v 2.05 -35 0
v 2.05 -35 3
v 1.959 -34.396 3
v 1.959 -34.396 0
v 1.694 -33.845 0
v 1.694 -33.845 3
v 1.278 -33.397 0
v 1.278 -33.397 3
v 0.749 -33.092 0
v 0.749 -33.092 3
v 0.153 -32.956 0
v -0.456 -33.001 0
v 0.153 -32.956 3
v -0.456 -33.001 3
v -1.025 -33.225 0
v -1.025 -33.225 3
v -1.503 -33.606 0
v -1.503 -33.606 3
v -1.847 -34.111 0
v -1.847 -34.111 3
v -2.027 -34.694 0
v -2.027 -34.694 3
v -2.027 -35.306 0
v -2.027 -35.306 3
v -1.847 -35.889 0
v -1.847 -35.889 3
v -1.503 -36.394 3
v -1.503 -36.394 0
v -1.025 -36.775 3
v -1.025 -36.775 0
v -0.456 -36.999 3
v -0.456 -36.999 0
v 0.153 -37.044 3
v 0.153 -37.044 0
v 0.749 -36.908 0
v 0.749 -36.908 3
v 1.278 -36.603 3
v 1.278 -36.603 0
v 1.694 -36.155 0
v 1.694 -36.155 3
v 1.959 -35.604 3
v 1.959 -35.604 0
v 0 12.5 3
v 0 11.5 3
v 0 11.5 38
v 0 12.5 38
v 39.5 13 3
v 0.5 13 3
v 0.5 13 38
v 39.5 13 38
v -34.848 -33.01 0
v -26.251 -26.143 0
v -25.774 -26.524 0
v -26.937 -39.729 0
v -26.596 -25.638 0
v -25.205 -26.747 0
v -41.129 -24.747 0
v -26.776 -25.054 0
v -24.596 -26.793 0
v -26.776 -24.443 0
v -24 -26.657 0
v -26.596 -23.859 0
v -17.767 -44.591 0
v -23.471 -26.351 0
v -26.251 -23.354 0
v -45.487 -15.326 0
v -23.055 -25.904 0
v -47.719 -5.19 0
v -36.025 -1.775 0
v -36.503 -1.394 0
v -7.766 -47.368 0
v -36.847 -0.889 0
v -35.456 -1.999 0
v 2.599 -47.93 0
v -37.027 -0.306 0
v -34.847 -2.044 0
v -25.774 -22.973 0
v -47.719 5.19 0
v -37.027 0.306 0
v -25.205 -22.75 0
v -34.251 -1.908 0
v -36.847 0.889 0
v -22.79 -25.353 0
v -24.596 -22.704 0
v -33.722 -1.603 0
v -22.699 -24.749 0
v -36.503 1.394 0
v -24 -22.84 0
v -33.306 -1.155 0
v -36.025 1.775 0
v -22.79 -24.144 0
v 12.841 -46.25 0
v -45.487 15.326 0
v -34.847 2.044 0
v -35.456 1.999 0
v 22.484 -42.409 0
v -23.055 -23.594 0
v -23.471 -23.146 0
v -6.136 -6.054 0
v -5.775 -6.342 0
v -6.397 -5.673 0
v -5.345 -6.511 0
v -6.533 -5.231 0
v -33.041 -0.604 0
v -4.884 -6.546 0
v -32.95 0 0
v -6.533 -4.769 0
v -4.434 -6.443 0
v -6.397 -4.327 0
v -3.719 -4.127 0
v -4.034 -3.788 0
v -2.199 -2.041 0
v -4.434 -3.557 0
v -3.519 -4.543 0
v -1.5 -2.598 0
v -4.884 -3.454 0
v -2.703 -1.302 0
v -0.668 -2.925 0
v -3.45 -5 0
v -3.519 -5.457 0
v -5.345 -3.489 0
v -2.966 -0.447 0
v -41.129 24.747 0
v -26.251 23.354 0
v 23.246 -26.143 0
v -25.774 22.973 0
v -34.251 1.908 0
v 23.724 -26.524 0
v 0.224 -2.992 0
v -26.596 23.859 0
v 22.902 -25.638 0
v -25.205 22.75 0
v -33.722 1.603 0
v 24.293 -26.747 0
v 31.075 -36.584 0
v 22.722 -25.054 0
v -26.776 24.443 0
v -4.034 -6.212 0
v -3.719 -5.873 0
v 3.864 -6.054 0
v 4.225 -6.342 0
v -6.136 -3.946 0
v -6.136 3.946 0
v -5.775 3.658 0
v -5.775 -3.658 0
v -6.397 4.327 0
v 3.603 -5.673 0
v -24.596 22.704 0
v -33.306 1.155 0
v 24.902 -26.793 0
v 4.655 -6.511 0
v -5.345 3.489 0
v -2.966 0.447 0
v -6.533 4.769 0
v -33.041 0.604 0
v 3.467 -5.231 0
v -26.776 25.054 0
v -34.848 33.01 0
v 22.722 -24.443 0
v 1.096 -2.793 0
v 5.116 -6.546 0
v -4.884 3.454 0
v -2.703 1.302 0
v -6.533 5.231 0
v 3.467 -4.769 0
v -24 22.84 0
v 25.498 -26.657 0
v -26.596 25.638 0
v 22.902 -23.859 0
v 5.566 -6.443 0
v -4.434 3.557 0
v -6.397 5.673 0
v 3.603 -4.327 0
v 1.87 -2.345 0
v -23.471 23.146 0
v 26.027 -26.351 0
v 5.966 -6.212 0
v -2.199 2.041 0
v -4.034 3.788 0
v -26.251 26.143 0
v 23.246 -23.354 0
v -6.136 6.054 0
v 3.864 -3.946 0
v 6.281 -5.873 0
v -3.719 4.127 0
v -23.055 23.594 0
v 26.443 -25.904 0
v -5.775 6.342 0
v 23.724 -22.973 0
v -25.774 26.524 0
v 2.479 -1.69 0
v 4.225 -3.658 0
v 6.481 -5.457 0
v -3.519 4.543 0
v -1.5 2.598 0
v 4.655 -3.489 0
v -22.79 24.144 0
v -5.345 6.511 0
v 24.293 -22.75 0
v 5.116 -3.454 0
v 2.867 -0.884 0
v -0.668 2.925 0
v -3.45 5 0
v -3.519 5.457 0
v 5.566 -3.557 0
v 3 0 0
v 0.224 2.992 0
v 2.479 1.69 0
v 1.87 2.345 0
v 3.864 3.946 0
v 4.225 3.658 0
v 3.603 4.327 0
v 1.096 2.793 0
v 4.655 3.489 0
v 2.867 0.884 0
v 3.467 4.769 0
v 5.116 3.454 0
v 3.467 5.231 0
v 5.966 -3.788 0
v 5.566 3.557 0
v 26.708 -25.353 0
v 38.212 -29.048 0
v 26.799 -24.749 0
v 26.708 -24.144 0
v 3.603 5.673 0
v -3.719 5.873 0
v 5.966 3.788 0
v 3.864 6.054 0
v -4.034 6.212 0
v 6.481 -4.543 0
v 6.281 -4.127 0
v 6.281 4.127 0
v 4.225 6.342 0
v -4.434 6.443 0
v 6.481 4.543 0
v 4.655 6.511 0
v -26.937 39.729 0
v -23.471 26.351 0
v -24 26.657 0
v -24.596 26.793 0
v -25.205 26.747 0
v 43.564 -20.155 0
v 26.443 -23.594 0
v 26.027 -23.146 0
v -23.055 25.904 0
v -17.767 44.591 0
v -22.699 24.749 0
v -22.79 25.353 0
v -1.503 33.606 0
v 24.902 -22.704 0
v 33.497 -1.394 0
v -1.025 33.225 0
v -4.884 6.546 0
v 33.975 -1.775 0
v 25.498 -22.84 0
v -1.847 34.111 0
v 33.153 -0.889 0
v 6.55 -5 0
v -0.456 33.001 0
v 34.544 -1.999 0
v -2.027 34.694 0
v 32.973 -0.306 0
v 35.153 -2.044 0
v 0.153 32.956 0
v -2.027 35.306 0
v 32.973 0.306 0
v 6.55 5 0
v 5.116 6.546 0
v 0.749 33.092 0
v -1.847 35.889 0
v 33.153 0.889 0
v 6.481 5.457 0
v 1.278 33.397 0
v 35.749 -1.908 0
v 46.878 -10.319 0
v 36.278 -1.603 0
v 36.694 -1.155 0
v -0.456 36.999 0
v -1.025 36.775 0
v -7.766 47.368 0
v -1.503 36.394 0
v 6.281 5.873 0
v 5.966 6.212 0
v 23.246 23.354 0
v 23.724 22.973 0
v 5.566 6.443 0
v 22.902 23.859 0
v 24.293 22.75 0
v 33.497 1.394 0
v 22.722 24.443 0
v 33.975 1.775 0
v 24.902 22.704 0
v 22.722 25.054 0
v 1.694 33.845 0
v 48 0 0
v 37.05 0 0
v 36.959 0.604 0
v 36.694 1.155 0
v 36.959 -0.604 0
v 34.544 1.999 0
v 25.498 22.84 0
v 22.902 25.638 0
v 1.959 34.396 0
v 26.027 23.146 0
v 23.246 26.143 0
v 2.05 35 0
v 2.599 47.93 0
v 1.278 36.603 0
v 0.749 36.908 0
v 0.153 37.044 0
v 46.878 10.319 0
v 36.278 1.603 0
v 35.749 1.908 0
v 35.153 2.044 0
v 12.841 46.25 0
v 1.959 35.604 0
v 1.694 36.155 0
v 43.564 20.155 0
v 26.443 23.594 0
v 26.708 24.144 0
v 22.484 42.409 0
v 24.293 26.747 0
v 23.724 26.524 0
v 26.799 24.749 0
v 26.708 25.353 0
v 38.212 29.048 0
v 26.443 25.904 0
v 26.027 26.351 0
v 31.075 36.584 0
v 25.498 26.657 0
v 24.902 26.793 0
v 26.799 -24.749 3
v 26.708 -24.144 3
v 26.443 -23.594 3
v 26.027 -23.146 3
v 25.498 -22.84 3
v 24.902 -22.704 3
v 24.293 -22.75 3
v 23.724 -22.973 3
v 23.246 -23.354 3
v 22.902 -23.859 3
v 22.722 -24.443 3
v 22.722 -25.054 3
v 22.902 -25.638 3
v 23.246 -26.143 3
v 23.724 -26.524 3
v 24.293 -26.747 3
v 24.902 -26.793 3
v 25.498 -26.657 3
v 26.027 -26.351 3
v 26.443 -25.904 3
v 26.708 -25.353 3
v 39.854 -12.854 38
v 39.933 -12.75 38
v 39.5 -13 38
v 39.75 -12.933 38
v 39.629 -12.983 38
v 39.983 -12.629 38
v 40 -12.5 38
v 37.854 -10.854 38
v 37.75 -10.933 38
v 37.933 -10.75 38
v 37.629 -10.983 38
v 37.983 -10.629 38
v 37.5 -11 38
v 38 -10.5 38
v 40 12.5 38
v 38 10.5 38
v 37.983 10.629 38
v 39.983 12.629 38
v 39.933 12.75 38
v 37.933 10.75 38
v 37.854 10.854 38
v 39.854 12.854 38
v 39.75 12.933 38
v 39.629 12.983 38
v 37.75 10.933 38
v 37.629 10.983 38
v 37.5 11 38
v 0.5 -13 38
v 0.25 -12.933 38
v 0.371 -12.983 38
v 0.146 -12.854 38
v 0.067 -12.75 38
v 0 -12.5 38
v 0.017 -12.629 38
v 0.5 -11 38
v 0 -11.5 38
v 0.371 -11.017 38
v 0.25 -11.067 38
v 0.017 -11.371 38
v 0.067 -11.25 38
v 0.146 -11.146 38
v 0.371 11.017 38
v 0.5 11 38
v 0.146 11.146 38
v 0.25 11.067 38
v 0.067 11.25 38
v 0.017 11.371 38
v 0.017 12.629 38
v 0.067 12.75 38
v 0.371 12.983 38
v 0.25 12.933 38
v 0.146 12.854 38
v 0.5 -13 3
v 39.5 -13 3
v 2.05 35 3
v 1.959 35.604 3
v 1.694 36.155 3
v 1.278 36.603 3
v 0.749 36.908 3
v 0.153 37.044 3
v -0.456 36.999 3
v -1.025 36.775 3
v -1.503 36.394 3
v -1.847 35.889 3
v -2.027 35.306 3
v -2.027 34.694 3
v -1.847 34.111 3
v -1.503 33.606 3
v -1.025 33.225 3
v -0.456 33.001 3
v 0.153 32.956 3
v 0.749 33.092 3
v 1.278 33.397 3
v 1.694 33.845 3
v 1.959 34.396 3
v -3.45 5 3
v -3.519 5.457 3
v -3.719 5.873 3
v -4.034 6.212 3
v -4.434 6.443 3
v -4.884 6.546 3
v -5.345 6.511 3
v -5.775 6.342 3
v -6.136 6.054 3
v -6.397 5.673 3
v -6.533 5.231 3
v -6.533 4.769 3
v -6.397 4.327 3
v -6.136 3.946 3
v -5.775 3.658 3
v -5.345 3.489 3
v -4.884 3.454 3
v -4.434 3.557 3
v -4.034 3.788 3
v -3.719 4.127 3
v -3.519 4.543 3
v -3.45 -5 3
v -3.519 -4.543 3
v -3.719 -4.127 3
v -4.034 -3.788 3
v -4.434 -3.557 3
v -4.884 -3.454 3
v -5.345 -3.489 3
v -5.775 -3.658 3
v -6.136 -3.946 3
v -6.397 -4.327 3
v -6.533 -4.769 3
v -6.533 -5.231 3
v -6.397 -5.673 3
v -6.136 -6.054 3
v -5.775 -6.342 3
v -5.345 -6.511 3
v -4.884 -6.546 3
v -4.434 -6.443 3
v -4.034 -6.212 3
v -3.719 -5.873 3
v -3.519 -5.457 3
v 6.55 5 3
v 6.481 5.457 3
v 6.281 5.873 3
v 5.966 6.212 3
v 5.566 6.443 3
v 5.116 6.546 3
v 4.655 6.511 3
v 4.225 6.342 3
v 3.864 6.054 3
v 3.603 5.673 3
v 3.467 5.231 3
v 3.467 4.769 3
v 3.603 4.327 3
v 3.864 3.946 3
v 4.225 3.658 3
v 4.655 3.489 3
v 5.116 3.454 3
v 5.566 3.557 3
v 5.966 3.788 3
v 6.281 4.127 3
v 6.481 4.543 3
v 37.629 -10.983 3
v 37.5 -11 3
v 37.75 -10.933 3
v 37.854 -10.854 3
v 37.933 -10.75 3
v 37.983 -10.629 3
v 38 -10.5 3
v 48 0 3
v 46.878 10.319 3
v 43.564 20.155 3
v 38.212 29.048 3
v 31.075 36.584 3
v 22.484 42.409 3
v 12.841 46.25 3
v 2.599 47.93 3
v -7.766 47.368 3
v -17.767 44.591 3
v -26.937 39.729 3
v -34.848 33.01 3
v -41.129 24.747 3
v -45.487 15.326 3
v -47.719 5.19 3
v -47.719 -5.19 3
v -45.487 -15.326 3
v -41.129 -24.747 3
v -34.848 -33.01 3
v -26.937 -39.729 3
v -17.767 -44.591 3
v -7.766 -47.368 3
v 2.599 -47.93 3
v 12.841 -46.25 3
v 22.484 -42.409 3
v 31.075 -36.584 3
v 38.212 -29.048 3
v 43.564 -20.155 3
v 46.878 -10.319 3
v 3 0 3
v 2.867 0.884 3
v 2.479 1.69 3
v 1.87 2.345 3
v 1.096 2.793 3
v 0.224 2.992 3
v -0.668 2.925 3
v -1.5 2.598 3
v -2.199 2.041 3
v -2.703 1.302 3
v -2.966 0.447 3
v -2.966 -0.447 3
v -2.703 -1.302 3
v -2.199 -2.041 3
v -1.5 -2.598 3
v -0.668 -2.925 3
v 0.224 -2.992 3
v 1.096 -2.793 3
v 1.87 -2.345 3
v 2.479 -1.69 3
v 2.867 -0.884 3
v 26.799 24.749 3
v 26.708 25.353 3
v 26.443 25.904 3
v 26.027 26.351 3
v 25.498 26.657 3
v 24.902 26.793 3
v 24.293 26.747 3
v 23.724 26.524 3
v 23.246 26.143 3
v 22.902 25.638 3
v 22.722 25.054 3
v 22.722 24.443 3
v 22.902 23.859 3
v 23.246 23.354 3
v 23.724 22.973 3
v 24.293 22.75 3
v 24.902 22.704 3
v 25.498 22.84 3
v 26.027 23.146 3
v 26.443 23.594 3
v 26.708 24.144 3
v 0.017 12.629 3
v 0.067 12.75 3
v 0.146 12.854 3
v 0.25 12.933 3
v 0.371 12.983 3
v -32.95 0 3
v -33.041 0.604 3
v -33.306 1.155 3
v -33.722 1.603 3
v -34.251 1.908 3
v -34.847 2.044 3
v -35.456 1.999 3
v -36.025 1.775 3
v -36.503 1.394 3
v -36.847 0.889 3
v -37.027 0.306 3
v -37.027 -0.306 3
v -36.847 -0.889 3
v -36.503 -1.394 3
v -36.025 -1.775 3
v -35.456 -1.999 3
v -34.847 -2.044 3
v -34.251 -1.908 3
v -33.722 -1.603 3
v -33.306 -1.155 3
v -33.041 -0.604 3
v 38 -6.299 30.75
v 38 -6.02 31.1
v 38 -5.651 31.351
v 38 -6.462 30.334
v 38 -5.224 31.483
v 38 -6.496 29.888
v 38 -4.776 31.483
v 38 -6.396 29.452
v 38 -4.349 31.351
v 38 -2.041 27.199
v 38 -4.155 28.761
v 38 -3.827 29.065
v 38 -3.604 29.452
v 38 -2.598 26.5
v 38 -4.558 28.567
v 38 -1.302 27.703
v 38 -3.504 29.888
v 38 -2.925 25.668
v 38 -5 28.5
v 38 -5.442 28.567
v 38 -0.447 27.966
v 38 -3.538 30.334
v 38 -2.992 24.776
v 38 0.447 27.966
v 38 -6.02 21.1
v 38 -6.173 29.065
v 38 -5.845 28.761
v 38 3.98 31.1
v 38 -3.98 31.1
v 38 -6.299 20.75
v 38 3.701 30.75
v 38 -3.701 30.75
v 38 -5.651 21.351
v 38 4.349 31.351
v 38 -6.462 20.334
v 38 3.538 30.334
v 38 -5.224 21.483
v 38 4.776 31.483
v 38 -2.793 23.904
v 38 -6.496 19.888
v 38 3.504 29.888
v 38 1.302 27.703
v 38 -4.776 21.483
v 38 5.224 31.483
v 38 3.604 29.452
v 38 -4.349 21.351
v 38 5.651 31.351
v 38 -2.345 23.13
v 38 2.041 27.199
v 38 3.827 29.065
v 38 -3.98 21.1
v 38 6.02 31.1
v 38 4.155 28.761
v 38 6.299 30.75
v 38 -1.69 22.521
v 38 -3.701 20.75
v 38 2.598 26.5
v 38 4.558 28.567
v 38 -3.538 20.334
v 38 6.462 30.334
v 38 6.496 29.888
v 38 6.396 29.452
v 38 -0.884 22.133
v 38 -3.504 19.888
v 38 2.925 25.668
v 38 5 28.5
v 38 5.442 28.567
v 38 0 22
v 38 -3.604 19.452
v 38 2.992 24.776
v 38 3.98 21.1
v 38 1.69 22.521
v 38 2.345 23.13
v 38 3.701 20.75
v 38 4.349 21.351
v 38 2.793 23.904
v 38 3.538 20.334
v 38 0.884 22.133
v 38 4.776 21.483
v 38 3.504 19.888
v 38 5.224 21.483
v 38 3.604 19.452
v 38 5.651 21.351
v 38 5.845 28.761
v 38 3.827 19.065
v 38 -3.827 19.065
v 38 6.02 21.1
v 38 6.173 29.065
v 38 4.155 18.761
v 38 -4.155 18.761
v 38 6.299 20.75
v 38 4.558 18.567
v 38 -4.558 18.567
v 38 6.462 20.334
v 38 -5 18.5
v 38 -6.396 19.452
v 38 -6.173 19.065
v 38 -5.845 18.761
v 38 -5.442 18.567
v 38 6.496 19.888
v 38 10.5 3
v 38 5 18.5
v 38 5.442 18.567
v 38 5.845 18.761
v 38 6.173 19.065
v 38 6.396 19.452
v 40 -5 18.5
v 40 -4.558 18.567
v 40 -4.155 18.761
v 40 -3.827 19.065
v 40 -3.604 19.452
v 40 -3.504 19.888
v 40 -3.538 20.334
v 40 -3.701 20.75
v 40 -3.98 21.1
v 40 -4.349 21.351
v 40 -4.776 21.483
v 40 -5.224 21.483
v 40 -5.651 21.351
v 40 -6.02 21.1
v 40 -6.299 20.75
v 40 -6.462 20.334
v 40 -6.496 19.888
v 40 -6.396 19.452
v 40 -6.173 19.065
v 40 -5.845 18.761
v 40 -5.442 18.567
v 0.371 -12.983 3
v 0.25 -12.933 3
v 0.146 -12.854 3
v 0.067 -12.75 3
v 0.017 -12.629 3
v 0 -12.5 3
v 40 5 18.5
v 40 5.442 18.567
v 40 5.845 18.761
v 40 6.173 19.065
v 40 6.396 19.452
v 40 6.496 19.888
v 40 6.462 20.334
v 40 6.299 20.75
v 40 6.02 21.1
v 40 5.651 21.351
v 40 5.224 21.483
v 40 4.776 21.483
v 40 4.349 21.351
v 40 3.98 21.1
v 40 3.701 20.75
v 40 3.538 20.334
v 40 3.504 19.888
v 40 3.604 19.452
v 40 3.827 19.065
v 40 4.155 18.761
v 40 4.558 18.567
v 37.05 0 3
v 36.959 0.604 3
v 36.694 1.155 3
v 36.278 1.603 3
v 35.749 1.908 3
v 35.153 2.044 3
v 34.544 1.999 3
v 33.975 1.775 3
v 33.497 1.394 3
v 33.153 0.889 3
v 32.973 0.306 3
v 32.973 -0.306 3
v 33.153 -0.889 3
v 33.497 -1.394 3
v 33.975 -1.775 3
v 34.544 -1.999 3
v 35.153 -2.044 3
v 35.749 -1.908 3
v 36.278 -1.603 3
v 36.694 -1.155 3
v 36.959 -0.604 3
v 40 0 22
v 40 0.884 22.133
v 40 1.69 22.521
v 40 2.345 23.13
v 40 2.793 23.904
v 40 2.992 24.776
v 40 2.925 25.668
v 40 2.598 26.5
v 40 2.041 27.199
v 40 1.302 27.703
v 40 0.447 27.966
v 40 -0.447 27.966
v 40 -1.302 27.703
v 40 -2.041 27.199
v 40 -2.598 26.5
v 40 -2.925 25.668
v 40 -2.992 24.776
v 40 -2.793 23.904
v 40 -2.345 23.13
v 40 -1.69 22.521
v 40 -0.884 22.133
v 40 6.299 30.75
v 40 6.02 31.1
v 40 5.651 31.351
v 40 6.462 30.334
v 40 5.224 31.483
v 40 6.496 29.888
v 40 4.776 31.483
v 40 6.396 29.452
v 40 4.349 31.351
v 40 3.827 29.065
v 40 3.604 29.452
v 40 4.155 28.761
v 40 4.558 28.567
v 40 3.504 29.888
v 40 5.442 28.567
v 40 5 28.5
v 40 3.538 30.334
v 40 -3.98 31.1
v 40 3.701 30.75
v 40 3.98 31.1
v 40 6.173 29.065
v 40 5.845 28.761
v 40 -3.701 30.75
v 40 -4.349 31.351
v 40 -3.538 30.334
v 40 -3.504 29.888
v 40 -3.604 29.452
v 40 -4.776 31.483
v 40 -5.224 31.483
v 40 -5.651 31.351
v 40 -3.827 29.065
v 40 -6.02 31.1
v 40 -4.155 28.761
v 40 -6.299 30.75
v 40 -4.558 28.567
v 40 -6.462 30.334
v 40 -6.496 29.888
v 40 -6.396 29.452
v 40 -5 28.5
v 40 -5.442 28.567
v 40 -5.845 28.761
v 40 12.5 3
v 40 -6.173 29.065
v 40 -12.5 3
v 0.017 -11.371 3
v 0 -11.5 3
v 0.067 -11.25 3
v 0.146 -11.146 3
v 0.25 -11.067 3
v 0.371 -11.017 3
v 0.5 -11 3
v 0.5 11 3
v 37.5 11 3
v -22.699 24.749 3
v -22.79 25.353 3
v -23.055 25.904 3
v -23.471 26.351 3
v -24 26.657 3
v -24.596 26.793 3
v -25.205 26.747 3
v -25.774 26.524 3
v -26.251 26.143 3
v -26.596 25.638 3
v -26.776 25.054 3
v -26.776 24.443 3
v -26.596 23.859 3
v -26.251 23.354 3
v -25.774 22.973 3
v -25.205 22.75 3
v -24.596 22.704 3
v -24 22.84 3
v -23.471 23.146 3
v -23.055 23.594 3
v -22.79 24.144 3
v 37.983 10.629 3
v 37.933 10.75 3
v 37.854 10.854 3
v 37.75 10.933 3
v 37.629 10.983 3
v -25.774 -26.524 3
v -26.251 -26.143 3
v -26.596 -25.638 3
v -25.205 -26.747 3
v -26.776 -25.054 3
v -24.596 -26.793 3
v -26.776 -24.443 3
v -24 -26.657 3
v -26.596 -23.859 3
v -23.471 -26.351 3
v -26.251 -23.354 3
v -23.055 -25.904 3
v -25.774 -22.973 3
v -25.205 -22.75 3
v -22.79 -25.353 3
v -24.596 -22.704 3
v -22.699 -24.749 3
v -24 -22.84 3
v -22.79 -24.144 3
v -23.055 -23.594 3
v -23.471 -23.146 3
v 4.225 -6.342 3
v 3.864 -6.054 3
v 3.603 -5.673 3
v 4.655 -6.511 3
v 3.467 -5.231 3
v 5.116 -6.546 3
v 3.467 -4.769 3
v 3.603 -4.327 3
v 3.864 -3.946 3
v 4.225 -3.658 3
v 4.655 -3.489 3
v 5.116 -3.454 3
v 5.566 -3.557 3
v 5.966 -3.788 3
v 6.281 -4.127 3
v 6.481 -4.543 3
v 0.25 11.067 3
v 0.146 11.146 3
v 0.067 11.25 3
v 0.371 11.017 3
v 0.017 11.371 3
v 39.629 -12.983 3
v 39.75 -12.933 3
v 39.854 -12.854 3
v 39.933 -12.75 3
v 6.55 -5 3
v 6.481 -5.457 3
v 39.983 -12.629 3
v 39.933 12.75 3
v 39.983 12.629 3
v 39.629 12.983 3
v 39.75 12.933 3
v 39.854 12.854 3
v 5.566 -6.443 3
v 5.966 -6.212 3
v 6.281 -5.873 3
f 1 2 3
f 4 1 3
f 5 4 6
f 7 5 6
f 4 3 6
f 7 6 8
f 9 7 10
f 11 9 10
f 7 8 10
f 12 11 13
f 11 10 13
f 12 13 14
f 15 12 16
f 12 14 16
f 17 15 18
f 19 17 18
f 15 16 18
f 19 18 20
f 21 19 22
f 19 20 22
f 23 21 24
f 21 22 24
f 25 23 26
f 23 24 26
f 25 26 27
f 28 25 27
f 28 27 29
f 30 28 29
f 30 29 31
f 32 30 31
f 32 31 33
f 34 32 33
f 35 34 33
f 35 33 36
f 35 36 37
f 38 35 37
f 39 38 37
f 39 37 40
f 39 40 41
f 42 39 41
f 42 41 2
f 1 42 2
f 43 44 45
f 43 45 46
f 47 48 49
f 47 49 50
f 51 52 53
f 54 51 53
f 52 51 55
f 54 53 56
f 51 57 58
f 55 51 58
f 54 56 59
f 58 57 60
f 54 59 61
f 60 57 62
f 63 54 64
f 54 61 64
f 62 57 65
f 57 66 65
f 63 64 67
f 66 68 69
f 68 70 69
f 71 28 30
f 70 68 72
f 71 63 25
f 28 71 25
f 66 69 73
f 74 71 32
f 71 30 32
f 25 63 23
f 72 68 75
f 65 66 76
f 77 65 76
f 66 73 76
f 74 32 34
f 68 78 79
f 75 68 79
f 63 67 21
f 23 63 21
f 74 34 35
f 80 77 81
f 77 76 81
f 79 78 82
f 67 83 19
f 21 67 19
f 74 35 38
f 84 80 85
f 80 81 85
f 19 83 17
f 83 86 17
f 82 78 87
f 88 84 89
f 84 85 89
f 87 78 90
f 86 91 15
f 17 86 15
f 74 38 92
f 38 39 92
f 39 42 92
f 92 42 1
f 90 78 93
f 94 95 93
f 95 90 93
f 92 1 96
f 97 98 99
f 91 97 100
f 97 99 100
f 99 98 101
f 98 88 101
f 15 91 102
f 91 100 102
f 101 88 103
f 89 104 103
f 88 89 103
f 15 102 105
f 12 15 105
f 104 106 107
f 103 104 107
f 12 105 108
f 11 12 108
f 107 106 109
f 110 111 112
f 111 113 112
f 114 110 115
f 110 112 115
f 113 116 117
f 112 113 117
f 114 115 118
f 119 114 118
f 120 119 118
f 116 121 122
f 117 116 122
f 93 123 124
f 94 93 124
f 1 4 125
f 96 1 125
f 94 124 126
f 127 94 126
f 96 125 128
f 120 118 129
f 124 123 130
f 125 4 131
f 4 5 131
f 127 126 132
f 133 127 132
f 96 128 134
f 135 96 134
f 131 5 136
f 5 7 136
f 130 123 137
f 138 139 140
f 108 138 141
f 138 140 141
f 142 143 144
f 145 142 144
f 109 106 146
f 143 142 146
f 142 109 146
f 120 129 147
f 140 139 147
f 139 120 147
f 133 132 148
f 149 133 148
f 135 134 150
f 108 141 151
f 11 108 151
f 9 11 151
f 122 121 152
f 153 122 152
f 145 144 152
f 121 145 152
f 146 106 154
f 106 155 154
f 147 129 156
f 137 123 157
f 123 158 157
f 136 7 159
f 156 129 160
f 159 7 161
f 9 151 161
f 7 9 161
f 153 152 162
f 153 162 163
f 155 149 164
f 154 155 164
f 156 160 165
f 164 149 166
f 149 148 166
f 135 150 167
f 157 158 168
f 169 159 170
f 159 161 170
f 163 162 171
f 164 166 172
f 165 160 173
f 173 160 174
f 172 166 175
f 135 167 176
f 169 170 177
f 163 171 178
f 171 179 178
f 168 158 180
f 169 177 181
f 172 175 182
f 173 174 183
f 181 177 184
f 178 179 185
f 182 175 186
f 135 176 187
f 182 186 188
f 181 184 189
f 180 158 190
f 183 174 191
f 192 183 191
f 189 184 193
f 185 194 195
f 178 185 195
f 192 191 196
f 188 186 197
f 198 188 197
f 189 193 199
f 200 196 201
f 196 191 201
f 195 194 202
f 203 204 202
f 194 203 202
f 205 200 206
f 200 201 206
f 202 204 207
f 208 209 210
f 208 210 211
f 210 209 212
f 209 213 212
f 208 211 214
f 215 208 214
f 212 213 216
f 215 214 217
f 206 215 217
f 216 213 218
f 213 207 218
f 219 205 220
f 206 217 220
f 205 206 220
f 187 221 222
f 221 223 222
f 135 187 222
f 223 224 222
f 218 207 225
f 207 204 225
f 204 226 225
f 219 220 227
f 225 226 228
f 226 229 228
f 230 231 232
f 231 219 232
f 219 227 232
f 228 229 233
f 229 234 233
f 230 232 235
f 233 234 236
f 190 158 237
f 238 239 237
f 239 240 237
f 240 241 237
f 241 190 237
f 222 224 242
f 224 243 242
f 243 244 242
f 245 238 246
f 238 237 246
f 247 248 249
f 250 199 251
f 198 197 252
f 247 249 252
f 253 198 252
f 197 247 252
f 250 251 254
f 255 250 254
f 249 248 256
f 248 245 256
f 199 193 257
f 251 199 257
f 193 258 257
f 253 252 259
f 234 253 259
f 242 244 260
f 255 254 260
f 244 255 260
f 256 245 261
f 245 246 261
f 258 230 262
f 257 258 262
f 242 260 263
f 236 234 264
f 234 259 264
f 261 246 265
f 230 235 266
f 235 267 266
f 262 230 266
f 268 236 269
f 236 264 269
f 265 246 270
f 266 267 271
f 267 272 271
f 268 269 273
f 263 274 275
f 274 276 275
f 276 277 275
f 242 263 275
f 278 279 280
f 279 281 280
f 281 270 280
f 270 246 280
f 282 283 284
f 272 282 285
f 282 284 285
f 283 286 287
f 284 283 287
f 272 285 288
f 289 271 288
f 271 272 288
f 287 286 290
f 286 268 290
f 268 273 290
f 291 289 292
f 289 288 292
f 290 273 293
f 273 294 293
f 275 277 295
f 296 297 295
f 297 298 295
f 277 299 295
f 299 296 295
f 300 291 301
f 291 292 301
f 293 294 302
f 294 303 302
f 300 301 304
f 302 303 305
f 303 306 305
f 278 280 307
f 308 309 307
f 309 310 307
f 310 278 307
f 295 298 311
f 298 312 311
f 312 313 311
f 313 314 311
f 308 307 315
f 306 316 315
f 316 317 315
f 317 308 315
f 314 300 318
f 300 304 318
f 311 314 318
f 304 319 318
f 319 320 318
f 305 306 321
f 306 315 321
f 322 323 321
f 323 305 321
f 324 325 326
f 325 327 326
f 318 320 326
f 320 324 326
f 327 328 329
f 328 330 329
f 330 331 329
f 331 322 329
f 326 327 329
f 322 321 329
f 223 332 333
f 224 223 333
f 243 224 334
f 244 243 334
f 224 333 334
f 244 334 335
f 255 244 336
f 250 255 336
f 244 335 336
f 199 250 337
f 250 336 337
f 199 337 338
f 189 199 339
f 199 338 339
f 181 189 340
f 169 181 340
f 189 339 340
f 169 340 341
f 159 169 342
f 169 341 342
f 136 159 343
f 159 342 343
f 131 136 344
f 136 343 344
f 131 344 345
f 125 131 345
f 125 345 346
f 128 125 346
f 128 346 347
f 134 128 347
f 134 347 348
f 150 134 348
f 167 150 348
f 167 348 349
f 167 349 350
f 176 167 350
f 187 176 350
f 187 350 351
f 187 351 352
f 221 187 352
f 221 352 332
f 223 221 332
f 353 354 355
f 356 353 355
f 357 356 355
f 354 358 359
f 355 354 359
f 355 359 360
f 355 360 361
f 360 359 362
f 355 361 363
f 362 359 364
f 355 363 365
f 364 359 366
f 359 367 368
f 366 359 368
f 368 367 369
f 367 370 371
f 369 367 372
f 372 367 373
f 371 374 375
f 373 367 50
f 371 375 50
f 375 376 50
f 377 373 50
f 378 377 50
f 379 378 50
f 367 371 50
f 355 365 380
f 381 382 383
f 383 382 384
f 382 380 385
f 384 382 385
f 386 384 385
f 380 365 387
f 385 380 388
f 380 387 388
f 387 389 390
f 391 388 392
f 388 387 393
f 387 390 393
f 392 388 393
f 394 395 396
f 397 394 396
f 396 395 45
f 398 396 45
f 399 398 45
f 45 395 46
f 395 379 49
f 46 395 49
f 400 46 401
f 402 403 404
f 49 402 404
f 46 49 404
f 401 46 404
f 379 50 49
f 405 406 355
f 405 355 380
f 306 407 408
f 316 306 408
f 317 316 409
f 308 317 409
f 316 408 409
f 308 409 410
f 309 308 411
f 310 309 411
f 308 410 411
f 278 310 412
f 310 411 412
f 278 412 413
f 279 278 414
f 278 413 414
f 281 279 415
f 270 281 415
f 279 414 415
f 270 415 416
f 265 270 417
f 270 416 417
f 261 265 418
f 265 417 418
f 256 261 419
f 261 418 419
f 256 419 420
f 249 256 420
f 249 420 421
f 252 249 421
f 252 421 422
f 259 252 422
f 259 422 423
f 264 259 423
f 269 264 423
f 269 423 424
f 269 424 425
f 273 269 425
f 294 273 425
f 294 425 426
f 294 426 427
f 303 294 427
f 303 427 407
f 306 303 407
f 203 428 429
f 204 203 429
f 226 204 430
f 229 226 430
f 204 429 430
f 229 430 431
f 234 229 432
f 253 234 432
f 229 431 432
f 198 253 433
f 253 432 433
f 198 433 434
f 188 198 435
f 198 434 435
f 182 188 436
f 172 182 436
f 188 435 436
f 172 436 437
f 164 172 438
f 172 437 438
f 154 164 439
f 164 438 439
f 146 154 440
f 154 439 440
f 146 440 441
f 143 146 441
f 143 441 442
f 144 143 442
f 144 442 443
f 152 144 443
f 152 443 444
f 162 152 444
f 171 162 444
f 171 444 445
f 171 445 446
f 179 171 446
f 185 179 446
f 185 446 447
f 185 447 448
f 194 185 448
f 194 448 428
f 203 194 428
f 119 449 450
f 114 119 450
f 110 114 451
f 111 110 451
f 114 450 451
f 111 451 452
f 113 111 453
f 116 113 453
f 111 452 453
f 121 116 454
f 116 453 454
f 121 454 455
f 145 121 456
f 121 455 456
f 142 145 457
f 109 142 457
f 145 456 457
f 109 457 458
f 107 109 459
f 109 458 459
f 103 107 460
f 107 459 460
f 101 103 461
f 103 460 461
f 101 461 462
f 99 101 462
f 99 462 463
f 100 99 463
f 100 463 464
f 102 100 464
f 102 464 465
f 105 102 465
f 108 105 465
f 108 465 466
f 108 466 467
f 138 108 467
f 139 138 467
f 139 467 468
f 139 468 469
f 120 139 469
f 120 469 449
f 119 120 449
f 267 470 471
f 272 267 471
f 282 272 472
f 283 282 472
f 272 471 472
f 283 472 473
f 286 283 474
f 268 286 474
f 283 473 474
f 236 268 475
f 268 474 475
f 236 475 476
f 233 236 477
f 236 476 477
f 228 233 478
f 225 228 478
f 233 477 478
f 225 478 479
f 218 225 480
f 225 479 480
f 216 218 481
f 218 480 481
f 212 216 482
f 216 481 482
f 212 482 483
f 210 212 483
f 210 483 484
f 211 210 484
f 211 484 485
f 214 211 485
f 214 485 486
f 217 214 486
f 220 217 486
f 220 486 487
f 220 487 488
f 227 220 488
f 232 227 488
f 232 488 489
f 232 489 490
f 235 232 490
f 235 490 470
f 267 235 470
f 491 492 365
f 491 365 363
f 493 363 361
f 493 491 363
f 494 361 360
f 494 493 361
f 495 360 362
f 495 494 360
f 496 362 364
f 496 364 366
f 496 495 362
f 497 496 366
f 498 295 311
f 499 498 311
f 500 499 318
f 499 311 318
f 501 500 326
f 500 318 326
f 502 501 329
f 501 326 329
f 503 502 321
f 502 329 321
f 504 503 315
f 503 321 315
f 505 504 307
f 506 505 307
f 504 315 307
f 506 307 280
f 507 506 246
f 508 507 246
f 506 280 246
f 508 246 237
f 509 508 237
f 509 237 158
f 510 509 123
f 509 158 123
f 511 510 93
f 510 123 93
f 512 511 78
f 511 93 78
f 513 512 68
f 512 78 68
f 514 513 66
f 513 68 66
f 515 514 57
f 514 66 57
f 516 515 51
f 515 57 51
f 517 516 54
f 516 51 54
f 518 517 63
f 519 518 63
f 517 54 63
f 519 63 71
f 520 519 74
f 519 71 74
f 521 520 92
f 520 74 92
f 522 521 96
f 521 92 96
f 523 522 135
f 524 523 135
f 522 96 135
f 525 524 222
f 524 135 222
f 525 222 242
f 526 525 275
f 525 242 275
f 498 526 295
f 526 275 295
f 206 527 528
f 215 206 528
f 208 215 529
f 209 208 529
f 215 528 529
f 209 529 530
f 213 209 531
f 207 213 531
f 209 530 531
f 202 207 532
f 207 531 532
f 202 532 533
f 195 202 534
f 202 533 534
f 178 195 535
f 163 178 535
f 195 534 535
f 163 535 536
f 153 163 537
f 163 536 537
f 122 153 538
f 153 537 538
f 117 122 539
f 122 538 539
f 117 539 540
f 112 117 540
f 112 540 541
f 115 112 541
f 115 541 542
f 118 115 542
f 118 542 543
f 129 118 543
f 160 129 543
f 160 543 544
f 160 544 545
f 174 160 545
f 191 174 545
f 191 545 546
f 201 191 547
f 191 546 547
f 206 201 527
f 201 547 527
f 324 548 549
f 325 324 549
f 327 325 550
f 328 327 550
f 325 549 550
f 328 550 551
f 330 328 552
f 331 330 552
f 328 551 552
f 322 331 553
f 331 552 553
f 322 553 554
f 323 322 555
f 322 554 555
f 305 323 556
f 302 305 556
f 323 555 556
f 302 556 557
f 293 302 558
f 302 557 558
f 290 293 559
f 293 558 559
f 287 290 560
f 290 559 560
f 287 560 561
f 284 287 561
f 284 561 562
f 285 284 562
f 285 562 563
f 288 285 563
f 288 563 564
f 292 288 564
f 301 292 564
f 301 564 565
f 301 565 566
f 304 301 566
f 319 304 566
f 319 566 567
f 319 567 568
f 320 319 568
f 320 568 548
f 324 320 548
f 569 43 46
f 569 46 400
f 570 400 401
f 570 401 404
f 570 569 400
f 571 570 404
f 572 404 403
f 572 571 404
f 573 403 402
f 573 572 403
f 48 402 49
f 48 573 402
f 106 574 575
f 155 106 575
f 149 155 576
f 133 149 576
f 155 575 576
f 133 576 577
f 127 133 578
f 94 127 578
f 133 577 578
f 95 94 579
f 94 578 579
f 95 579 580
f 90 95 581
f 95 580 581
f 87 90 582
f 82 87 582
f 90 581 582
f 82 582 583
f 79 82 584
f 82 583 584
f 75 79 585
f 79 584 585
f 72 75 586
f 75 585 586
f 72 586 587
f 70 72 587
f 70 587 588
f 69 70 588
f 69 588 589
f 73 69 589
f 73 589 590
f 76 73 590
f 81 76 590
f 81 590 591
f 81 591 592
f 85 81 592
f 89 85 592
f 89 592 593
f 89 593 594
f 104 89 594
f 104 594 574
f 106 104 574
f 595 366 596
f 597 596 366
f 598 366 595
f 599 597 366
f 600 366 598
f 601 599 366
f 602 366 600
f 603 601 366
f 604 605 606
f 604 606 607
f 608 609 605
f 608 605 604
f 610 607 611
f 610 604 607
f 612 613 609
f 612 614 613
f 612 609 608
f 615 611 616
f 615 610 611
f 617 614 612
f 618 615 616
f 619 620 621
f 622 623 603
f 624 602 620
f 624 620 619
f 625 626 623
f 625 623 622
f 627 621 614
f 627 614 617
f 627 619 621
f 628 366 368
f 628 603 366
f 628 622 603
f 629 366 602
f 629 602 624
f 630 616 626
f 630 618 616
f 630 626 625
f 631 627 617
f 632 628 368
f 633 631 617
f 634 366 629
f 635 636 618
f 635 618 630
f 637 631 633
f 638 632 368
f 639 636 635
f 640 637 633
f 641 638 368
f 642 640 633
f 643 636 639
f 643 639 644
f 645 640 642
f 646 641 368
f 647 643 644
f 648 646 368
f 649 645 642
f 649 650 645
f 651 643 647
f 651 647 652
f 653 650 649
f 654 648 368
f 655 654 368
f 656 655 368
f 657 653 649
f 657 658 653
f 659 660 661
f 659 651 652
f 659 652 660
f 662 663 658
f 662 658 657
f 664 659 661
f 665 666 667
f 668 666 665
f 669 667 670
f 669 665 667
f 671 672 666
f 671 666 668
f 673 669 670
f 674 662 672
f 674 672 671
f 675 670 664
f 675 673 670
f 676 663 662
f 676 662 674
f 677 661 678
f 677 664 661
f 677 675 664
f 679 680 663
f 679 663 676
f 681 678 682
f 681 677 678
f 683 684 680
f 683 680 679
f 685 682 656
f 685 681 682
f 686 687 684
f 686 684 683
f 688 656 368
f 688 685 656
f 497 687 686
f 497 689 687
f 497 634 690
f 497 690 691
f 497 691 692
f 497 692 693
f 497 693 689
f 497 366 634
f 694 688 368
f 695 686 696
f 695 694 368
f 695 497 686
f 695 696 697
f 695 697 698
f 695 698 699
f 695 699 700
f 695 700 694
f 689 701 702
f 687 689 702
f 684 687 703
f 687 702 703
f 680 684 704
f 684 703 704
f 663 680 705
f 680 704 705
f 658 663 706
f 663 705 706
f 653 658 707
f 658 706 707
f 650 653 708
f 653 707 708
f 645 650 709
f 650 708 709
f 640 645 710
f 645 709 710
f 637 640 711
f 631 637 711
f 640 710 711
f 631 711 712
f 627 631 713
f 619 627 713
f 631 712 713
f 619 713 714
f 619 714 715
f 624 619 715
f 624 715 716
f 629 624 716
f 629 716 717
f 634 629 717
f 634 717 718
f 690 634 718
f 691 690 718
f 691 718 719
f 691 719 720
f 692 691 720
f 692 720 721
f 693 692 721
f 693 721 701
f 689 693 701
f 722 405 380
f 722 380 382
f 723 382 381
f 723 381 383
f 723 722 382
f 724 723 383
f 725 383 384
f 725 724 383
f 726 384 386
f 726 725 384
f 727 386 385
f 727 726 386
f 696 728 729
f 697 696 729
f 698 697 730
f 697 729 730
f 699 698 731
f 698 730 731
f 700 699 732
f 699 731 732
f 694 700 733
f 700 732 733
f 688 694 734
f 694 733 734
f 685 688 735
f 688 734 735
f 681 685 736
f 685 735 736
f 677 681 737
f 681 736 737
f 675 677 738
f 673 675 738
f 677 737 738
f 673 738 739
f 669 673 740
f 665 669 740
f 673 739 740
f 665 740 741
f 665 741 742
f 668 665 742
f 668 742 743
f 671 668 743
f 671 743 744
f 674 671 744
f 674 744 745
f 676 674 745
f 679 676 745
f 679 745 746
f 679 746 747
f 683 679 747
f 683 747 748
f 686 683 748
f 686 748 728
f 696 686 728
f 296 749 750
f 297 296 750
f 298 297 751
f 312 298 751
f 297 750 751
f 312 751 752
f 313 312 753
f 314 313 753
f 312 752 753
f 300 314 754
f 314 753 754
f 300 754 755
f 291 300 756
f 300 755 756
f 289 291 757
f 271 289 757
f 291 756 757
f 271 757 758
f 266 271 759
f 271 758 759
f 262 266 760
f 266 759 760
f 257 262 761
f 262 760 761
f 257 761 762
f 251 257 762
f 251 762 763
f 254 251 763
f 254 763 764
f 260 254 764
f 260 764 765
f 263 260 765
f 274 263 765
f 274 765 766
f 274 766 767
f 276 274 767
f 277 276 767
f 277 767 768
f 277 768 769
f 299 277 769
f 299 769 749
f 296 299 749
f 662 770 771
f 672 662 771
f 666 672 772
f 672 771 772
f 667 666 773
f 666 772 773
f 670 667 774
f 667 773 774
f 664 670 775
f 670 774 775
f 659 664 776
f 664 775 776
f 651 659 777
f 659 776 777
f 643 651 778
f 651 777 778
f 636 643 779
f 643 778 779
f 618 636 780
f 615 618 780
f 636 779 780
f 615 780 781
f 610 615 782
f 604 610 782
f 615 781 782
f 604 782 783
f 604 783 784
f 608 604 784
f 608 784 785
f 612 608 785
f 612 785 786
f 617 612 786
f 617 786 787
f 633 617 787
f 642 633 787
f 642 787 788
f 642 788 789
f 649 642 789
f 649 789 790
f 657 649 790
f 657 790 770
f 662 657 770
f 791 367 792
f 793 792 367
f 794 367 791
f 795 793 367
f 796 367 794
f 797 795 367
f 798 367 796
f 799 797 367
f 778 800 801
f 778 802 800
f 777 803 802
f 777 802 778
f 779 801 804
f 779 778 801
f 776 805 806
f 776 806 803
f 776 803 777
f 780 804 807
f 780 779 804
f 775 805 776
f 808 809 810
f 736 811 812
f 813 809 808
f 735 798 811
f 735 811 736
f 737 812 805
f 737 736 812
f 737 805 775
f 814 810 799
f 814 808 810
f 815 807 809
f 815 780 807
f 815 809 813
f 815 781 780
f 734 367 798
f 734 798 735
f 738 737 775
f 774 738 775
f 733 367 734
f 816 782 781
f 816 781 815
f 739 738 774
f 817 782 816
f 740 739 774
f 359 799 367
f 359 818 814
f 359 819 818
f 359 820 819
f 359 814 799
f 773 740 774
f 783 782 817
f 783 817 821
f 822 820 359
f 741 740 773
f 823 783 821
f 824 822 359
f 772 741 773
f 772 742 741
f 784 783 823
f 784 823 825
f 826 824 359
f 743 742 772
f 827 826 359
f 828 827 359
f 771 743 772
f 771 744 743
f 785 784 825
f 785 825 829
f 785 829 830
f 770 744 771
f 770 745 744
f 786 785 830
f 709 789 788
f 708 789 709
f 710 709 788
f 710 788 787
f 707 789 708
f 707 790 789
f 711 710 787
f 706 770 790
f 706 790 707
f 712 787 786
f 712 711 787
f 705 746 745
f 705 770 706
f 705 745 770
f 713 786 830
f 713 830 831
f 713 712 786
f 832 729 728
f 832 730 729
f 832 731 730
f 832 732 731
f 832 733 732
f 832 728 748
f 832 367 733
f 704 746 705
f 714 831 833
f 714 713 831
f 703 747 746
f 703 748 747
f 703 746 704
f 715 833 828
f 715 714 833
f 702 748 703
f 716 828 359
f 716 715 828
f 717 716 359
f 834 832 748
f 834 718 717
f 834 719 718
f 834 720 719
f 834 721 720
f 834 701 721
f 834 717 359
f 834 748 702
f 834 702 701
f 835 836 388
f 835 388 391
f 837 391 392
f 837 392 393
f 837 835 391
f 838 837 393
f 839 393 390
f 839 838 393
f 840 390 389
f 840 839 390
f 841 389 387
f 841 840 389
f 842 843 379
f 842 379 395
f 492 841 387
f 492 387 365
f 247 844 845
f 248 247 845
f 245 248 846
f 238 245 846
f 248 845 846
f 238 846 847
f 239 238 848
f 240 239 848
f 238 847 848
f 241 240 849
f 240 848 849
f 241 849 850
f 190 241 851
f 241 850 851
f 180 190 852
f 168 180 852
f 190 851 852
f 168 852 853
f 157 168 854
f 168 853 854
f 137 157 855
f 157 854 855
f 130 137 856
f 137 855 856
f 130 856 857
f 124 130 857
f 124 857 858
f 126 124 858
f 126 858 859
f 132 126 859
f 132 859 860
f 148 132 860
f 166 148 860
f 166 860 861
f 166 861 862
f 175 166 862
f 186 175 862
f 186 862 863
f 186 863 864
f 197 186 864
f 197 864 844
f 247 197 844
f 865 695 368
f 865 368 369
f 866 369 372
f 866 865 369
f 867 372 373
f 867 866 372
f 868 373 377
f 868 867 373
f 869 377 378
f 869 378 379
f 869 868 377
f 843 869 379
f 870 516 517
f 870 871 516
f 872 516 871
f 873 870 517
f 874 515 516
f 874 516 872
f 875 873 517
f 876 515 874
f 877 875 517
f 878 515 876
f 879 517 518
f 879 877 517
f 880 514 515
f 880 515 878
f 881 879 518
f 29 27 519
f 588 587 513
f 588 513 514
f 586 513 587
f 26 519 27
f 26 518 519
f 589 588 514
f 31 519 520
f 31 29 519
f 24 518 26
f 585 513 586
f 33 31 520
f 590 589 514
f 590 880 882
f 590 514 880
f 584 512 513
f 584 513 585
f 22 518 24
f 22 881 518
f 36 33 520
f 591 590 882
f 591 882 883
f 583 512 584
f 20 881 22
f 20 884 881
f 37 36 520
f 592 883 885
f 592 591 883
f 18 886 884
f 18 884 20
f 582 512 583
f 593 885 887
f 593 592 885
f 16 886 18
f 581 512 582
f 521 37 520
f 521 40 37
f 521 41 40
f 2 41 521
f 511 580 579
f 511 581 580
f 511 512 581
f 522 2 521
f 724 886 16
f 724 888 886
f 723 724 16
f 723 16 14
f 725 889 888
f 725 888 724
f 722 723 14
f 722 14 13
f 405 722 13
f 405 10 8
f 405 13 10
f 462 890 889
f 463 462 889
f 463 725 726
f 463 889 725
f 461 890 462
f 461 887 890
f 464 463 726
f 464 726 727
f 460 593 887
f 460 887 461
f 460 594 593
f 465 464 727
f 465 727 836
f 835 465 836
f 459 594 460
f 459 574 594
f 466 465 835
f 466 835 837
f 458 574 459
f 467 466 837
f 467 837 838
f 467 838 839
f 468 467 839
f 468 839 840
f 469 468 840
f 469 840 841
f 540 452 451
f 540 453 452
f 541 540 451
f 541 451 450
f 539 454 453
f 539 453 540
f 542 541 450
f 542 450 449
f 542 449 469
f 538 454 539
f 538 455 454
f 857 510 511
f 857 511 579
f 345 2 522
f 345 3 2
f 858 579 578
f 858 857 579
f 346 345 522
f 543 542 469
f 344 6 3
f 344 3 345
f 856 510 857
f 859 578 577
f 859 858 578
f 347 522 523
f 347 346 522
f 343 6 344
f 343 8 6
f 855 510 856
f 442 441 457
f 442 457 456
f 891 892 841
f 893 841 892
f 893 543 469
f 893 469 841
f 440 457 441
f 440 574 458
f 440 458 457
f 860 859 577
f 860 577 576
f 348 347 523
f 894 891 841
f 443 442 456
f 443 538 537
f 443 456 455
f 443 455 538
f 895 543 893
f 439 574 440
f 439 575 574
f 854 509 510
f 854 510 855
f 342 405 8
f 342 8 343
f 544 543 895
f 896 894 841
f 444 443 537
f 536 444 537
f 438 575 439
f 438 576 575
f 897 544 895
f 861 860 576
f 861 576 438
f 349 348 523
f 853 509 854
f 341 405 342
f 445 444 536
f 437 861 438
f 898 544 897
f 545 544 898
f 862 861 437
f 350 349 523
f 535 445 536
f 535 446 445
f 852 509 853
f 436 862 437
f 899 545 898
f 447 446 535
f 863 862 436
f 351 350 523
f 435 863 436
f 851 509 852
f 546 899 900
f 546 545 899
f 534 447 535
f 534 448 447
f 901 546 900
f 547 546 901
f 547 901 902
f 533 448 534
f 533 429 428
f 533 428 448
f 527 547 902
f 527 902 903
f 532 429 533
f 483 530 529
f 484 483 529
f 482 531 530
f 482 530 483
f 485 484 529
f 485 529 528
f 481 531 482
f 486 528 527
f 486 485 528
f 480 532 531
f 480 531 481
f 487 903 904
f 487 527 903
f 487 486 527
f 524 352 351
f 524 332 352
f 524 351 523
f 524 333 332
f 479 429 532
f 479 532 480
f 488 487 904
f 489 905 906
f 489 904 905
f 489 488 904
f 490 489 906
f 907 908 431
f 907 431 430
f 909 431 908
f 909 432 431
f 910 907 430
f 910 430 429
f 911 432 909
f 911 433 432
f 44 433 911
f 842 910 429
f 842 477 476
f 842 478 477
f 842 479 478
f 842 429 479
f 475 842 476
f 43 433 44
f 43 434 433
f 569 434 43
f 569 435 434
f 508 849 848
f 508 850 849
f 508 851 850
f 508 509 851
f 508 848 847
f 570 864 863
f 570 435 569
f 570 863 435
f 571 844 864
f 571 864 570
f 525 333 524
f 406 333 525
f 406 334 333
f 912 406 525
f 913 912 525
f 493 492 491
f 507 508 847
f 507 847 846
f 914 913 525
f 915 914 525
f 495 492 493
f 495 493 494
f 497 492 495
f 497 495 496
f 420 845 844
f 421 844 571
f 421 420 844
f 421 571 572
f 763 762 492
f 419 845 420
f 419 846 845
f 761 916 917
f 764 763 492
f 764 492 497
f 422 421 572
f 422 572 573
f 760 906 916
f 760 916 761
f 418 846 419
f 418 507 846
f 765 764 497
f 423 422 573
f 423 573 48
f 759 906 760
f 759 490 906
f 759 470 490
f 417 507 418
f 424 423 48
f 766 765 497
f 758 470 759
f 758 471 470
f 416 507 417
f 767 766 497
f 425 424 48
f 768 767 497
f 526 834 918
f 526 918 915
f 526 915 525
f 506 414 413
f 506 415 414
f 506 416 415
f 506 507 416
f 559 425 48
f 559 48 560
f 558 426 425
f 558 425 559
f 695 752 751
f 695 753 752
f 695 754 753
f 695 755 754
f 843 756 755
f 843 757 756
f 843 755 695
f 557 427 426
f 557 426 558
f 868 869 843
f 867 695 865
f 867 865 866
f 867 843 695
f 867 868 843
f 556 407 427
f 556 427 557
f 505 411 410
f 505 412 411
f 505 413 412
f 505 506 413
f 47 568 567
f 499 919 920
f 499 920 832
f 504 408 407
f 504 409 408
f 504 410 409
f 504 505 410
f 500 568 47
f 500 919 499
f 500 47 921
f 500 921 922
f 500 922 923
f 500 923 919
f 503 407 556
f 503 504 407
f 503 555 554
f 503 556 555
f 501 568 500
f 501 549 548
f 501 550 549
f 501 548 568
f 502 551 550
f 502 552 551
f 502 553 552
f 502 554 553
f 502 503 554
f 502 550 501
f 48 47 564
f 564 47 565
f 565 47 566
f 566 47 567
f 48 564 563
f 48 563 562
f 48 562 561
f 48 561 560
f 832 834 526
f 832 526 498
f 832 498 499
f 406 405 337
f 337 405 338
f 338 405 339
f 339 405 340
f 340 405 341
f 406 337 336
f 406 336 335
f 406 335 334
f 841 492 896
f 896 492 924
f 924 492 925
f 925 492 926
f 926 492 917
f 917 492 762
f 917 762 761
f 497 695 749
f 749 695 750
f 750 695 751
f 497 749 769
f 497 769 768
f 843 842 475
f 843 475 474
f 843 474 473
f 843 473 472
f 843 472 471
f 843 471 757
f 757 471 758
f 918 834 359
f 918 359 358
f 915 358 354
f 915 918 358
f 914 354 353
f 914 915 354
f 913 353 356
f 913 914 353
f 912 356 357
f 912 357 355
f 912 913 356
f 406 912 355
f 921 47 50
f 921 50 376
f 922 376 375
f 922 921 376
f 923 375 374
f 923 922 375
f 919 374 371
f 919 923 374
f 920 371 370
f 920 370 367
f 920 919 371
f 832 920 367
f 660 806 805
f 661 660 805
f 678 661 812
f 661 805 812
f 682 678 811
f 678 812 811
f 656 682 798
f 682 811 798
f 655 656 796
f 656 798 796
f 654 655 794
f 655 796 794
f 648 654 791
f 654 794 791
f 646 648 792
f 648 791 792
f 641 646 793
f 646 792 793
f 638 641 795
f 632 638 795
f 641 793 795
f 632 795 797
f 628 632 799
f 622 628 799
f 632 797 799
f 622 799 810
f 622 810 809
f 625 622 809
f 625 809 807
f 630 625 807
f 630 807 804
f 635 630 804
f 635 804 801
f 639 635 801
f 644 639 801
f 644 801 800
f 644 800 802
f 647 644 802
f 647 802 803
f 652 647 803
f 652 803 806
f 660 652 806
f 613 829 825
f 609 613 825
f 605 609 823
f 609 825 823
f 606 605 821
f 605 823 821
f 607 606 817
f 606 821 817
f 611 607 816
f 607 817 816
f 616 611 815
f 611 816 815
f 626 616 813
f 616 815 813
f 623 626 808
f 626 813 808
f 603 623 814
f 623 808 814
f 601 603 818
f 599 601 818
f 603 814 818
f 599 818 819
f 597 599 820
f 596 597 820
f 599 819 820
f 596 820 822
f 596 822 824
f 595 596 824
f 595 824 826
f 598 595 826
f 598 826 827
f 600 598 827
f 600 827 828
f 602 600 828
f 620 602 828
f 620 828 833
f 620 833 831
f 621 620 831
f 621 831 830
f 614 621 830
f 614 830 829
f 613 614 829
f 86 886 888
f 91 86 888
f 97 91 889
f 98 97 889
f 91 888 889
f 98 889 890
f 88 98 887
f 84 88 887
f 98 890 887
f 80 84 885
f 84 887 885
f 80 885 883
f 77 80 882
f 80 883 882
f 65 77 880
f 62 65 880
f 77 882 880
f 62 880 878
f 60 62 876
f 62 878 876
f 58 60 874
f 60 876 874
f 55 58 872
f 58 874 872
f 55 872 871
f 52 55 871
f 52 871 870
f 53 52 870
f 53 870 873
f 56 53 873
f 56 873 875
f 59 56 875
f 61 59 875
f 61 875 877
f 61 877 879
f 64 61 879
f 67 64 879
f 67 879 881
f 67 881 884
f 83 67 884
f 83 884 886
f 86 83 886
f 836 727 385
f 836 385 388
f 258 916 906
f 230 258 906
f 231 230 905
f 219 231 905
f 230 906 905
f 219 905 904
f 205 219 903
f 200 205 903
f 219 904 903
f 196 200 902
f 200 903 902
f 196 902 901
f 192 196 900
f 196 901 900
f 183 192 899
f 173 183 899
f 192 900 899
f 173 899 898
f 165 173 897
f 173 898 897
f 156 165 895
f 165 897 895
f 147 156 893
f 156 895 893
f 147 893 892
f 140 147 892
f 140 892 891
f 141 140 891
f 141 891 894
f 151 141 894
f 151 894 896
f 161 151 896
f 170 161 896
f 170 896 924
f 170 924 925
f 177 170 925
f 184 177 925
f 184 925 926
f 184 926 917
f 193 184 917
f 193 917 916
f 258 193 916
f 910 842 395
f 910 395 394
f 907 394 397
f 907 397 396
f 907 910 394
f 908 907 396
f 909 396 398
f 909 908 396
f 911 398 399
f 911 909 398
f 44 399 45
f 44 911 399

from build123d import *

# Parameters (mm, degrees)
SKETCH_3_R          = 48
EXTRUDE_2_DEPTH     = 3
SKETCH_4_R          = 3
CUT_EXTRUDE_1_DEPTH = 3
EXTRUDE_3_DEPTH     = 35
SKETCH_6_R          = 3
SKETCH_6_R_2        = 1.5
CUT_EXTRUDE_2_DEPTH = 35
SKETCH_7_R          = 1.55
CUT_EXTRUDE_5_DEPTH = 35
SKETCH_8_R          = 2.05
CUT_EXTRUDE_6_DEPTH = 10
SKETCH_9_R          = 1.55
CUT_EXTRUDE_7_DEPTH = 10


with BuildPart() as part:
    # 草图3 → 凸台-拉伸2 (new body)
    with BuildSketch(Plane.XY):
        Circle(SKETCH_3_R)
    extrude(amount=EXTRUDE_2_DEPTH)

    # 草图4 → 切除-拉伸1 (cut)
    with BuildSketch(Plane.XY.offset(3)):
        Circle(SKETCH_4_R)
    extrude(amount=-CUT_EXTRUDE_1_DEPTH, mode=Mode.SUBTRACT)

    # 草图5 → 凸台-拉伸3 (add)
    with BuildSketch(Plane.XY.offset(3)):
        with BuildLine():
            ThreePointArc((0, 12.5), (0.146446609, 12.853553391), (0.5, 13))
            Line((0.5, 13), (39.5, 13))
            ThreePointArc((39.5, 13), (39.853553391, 12.853553391), (40, 12.5))
            Line((40, 12.5), (40, -12.5))
            ThreePointArc((40, -12.5), (39.853553391, -12.853553391), (39.5, -13))
            Line((39.5, -13), (0.5, -13))
            ThreePointArc((0.5, -13), (0.146446609, -12.853553391), (0, -12.5))
            Line((0, -12.5), (0, -11.5))
            ThreePointArc((0, -11.5), (0.146446609, -11.146446609), (0.5, -11))
            Line((0.5, -11), (37.5, -11))
            ThreePointArc((37.5, -11), (37.853553391, -10.853553391), (38, -10.5))
            Line((38, -10.5), (38, 0))
            Line((38, 0), (38, 10.5))
            ThreePointArc((38, 10.5), (37.853553391, 10.853553391), (37.5, 11))
            Line((37.5, 11), (0.5, 11))
            ThreePointArc((0.5, 11), (0.146446609, 11.146446609), (0, 11.5))
            Line((0, 11.5), (0, 12.5))
        make_face()
    extrude(amount=EXTRUDE_3_DEPTH)

    # 草图6 → 切除-拉伸2 (cut)
    with BuildSketch(Plane(origin=(40, 0, 0), x_dir=(0, 0, -1), z_dir=(1, 0, 0))):
        with Locations((-25, 0)):
            Circle(SKETCH_6_R)
        with Locations((-20, -5)):
            Circle(SKETCH_6_R_2)
        with Locations((-20, 5)):
            Circle(SKETCH_6_R_2)
        with Locations((-30, -5)):
            Circle(SKETCH_6_R_2)
        with Locations((-30, 5)):
            Circle(SKETCH_6_R_2)
    extrude(amount=-CUT_EXTRUDE_2_DEPTH, mode=Mode.SUBTRACT)

    # 草图7 → 切除-拉伸5 (cut)
    with BuildSketch(Plane.XY.offset(3)):
        with Locations((-35, 0)):
            Circle(SKETCH_7_R)
        with Locations((-24.748737342, 24.748737342)):
            Circle(SKETCH_7_R)
        with Locations((0, 35)):
            Circle(SKETCH_7_R)
        with Locations((24.748737342, 24.748737342)):
            Circle(SKETCH_7_R)
        with Locations((35, 0)):
            Circle(SKETCH_7_R)
        with Locations((24.748737342, -24.748737342)):
            Circle(SKETCH_7_R)
        with Locations((0, -35)):
            Circle(SKETCH_7_R)
        with Locations((-24.748737342, -24.748737342)):
            Circle(SKETCH_7_R)
    extrude(amount=-CUT_EXTRUDE_5_DEPTH, mode=Mode.SUBTRACT)

    # 草图8 → 切除-拉伸6 (cut)
    with BuildSketch(Plane.XY.offset(3)):
        with Locations((0, 35)):
            Circle(SKETCH_8_R)
        with Locations((24.748737342, 24.748737342)):
            Circle(SKETCH_8_R)
        with Locations((35, 0)):
            Circle(SKETCH_8_R)
        with Locations((24.748737342, -24.748737342)):
            Circle(SKETCH_8_R)
        with Locations((0, -35)):
            Circle(SKETCH_8_R)
        with Locations((-24.748737342, -24.748737342)):
            Circle(SKETCH_8_R)
        with Locations((-35, 0)):
            Circle(SKETCH_8_R)
        with Locations((-24.748737342, 24.748737342)):
            Circle(SKETCH_8_R)
    extrude(amount=-CUT_EXTRUDE_6_DEPTH, mode=Mode.SUBTRACT)

    # 草图9 → 切除-拉伸7 (cut)
    with BuildSketch(Plane.XY.offset(3)):
        with Locations((-5, 5)):
            Circle(SKETCH_9_R)
        with Locations((5, 5)):
            Circle(SKETCH_9_R)
        with Locations((5, -5)):
            Circle(SKETCH_9_R)
        with Locations((-5, -5)):
            Circle(SKETCH_9_R)
    extrude(amount=-CUT_EXTRUDE_7_DEPTH, mode=Mode.SUBTRACT)


solid = part.part
